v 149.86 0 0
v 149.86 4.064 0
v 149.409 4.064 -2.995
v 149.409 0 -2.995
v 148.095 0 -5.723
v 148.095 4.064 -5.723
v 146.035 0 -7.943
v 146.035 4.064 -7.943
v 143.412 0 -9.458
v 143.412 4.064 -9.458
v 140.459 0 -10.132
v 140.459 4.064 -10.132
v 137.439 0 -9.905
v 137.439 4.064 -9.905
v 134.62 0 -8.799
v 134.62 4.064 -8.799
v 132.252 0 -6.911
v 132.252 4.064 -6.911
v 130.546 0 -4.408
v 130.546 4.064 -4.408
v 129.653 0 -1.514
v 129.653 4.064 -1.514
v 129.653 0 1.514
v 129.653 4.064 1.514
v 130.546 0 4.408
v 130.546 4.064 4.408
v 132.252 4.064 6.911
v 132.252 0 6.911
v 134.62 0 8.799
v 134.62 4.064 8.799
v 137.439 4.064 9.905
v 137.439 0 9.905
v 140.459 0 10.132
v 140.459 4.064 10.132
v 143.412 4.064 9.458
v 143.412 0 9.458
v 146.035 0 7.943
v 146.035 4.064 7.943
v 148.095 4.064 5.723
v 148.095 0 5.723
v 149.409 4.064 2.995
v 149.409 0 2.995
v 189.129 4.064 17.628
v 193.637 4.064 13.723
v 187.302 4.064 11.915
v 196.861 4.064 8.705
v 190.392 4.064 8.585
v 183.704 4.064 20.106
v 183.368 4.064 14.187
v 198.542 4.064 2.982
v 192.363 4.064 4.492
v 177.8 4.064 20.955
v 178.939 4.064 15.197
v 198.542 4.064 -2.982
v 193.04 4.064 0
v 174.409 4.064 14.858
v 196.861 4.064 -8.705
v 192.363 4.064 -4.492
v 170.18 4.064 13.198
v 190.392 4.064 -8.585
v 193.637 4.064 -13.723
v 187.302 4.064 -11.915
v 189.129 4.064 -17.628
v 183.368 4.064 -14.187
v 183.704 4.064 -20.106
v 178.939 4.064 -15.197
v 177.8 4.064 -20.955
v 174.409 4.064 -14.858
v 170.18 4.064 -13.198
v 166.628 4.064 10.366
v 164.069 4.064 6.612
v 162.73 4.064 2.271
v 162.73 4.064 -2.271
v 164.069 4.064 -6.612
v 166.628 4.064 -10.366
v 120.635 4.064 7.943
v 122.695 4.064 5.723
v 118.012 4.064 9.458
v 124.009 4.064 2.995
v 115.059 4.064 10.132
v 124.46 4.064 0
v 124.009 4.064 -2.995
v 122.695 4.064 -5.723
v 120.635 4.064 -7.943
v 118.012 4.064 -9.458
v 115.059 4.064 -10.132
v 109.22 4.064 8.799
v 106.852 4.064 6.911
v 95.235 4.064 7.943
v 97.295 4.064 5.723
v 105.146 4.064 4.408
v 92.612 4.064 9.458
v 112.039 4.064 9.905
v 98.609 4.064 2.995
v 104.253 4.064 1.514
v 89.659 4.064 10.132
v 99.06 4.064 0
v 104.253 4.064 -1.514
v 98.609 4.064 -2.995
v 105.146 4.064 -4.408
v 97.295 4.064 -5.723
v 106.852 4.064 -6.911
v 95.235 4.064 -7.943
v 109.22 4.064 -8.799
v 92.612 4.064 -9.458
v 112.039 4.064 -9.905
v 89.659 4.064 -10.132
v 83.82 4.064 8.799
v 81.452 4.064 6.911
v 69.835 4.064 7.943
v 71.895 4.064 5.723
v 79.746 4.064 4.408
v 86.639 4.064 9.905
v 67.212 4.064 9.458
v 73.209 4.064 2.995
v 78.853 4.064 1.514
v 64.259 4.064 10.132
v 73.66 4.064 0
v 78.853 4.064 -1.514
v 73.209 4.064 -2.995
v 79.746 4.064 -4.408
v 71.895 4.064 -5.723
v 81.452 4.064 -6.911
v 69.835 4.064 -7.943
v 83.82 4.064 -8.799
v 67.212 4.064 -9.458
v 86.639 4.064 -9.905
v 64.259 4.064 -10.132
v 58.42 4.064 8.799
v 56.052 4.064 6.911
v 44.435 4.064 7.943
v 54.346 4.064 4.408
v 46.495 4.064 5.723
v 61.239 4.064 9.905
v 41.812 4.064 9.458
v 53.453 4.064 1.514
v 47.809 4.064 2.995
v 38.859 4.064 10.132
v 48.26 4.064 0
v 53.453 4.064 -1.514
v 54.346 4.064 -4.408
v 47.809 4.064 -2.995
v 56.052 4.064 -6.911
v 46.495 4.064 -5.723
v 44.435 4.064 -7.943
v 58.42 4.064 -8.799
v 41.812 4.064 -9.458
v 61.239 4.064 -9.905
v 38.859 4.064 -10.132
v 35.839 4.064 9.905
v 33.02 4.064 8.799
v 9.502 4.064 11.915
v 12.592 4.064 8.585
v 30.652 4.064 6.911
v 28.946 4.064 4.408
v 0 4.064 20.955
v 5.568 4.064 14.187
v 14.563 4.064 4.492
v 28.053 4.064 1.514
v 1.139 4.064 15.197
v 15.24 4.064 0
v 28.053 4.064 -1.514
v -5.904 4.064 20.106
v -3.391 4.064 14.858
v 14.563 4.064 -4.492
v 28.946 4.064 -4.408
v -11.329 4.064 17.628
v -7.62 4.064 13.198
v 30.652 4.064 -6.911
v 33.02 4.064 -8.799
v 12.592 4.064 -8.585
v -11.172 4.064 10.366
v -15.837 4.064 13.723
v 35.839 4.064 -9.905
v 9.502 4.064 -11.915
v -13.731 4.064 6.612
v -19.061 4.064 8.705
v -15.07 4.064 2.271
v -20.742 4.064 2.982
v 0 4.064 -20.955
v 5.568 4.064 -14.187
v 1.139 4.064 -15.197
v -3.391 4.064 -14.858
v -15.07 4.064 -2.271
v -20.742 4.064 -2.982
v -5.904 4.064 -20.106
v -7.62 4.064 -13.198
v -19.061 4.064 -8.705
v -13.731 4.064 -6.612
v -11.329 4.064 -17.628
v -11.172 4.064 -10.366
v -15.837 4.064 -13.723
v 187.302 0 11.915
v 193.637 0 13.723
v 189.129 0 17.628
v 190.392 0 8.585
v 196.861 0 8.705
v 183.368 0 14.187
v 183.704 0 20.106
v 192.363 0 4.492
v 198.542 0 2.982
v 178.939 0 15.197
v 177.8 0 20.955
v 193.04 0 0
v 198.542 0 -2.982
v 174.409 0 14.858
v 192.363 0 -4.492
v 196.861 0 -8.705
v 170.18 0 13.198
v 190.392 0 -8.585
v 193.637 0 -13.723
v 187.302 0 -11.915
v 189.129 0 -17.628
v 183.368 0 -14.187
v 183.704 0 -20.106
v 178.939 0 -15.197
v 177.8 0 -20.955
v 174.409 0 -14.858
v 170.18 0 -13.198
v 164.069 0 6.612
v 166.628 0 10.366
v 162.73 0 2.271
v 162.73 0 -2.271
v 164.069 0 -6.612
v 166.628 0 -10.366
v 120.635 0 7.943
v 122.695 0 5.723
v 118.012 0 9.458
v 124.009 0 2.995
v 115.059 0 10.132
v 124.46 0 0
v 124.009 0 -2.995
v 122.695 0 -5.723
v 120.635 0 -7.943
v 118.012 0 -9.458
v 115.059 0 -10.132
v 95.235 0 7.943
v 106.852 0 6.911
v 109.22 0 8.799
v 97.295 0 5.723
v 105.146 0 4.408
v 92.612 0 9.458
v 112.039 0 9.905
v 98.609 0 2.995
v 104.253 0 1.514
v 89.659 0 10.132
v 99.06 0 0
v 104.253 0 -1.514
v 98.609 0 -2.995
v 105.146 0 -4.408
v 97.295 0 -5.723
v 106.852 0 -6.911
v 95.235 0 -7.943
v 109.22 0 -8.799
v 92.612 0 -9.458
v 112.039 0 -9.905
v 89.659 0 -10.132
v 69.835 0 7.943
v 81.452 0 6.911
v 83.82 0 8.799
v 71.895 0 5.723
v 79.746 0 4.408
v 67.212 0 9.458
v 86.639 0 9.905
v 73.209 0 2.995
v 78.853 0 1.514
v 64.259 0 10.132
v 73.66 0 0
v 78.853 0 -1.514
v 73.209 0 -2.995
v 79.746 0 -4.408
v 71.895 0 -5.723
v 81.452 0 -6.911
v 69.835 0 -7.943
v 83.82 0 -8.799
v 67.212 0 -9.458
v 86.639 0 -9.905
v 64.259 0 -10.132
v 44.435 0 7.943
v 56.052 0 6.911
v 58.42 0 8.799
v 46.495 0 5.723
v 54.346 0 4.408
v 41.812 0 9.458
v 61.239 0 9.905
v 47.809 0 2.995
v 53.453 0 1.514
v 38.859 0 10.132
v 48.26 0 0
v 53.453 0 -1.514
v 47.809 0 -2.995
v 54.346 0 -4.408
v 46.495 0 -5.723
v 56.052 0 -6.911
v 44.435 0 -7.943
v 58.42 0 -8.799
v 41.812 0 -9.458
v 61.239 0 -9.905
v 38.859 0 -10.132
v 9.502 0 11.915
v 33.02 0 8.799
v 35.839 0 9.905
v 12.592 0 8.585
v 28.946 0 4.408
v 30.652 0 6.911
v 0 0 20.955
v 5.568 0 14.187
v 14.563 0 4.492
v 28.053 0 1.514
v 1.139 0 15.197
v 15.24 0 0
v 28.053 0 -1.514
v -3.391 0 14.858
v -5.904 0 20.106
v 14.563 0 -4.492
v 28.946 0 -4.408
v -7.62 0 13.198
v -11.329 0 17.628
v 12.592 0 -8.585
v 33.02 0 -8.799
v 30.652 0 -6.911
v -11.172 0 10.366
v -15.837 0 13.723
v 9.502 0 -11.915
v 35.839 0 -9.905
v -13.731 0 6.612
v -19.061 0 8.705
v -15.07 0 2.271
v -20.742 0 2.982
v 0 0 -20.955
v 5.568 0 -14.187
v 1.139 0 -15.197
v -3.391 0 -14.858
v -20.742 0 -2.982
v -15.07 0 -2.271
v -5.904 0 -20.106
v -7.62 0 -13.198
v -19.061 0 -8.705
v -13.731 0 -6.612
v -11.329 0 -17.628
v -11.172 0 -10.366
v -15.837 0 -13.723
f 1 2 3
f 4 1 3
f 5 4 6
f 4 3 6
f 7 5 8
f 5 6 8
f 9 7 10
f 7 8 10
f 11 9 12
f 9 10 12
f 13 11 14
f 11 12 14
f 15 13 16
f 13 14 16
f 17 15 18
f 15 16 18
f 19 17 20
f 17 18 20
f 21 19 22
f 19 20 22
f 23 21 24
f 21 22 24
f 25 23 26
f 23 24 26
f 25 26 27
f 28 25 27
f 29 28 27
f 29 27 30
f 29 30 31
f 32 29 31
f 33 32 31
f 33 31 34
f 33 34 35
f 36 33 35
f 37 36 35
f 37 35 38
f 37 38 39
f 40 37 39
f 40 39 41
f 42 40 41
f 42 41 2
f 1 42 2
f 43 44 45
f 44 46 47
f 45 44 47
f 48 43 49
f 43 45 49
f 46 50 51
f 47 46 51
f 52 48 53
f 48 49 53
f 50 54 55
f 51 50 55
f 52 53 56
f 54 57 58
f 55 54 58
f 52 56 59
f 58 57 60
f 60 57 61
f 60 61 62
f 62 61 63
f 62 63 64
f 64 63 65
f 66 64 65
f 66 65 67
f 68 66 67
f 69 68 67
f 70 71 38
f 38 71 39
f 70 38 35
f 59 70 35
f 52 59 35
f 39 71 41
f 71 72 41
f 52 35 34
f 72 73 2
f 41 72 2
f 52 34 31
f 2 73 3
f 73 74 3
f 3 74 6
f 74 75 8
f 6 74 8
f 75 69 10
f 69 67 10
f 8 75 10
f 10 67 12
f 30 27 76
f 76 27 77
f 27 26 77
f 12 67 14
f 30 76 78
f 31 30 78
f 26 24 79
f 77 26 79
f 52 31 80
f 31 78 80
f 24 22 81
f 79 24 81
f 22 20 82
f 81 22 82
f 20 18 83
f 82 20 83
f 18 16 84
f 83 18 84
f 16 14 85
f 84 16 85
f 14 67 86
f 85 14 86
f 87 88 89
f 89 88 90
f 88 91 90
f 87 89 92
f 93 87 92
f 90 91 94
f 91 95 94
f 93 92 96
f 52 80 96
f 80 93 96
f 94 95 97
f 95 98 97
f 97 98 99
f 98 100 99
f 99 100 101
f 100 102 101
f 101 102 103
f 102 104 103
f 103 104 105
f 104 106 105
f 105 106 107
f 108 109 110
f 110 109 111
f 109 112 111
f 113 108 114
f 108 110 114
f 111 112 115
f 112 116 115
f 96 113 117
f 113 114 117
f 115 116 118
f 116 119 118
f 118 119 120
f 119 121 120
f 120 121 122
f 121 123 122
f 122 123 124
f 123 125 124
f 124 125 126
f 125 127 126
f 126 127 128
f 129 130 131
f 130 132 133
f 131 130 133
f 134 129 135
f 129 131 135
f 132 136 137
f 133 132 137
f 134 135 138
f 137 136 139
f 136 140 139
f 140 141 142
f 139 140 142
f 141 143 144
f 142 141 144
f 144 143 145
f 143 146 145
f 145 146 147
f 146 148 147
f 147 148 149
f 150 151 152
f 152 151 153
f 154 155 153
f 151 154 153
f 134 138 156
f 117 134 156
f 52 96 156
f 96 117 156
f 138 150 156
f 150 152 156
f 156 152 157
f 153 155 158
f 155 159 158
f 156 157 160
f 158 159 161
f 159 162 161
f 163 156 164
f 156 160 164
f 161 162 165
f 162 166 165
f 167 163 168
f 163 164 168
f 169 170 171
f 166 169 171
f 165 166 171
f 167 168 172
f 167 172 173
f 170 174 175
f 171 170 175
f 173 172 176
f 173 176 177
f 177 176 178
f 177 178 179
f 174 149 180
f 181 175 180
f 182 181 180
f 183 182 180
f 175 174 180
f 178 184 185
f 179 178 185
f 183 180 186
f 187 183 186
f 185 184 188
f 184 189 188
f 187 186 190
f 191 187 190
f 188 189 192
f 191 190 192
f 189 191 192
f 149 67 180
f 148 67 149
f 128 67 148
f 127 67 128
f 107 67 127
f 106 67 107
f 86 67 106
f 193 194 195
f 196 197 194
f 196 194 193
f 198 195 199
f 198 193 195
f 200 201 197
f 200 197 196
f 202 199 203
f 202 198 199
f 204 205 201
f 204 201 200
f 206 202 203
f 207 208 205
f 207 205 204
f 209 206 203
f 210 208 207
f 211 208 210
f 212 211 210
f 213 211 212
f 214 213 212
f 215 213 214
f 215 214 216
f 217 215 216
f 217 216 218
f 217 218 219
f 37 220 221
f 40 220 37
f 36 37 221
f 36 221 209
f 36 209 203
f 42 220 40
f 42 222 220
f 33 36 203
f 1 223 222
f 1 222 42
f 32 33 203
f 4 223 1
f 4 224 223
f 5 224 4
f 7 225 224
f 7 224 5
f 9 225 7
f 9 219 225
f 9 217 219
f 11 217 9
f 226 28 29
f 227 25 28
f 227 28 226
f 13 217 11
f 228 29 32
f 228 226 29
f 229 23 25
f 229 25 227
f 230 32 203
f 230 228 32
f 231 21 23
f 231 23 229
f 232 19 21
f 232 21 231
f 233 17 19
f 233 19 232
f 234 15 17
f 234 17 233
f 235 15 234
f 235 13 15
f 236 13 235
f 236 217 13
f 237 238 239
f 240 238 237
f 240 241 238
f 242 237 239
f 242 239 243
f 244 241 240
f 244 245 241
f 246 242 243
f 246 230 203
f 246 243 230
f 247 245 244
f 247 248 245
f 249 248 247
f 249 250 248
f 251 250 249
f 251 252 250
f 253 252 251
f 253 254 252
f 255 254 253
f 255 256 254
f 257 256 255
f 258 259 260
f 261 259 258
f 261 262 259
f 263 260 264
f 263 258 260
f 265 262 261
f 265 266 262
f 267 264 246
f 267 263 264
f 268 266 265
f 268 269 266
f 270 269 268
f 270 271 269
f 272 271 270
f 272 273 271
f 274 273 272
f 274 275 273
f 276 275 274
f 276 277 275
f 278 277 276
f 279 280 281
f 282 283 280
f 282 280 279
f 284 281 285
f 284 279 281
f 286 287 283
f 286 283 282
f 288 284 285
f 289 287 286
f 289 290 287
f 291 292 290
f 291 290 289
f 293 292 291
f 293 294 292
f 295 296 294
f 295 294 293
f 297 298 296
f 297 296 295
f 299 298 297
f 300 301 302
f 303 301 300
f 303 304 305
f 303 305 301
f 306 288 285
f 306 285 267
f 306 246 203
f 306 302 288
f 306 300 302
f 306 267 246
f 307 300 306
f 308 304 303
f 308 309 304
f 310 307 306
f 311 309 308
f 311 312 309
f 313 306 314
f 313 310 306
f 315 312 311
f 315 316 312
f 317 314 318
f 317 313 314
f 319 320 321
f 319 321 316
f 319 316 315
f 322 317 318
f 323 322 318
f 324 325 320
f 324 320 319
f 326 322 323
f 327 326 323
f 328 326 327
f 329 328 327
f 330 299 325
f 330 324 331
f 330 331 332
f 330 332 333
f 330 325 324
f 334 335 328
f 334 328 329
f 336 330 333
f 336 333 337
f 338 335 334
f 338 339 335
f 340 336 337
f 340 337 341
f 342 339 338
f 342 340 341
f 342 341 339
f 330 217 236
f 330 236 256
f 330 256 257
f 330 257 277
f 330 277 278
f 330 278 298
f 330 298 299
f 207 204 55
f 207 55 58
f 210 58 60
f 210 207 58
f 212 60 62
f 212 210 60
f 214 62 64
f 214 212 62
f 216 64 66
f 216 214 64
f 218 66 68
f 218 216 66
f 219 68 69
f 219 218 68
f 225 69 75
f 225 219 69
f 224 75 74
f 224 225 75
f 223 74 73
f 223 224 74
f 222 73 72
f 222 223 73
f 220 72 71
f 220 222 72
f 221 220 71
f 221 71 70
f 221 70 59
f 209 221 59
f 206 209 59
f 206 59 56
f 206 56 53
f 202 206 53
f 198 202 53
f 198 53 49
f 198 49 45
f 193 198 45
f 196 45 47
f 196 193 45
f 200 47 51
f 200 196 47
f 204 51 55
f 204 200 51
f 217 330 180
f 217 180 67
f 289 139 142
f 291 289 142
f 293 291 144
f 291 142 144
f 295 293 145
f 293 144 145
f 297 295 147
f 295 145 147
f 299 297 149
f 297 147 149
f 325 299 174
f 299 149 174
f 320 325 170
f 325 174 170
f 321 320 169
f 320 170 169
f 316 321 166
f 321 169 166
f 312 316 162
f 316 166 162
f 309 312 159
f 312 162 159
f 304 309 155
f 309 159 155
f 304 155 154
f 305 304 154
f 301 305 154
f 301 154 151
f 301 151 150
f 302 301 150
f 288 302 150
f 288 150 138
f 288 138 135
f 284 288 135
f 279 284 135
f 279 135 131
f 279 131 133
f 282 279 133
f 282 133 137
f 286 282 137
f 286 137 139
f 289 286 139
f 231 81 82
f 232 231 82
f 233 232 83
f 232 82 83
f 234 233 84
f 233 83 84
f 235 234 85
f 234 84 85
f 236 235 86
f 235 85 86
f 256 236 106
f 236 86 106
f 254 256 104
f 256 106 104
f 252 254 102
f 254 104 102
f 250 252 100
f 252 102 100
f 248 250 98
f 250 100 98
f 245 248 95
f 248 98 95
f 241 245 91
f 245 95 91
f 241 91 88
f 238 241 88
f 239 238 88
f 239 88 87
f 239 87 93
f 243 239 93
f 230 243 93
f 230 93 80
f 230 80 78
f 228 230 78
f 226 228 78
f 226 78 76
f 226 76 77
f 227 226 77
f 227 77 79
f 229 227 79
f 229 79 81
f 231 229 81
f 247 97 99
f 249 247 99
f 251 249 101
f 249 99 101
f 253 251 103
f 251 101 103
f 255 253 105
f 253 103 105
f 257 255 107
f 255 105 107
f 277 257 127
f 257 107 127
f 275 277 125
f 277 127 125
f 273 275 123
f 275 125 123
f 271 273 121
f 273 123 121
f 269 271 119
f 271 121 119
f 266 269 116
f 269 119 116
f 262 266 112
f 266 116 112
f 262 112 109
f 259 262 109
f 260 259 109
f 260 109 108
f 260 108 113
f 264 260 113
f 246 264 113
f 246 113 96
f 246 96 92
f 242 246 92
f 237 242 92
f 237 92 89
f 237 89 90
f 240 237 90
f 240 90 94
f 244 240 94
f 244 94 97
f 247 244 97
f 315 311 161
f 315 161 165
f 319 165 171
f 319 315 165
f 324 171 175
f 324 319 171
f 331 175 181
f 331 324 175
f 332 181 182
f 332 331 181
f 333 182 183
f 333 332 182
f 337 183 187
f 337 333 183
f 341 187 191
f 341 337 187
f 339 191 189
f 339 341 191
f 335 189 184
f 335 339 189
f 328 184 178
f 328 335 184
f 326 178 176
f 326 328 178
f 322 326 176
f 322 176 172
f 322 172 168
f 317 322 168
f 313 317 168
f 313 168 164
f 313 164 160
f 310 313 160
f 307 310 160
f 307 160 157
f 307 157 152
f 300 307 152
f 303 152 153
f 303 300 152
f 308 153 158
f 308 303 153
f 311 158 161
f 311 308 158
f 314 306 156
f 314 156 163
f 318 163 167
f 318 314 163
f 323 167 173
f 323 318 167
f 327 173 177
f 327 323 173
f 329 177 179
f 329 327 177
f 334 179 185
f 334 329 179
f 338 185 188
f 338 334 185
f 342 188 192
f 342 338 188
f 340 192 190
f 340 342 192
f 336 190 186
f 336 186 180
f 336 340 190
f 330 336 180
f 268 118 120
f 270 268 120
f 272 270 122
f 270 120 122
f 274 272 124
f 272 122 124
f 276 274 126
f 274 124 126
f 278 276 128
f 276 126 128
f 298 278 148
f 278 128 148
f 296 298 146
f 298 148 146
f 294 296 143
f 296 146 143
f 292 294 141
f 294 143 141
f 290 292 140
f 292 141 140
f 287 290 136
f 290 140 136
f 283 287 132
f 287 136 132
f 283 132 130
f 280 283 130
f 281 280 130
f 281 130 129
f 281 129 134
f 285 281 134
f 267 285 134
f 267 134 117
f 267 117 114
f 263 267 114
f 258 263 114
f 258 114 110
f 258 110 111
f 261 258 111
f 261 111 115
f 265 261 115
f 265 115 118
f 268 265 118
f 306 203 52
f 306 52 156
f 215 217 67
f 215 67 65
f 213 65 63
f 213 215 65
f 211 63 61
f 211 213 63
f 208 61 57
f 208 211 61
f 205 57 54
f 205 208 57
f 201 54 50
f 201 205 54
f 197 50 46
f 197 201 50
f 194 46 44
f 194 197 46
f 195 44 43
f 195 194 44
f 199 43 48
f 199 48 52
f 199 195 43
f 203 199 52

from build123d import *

# Parameters (mm, degrees)
SKETCH1_R           = 15.24
BOSS_EXTRUDE1_DEPTH = 4.064
SKETCH2_R           = 10.16
CUT_EXTRUDE1_DEPTH  = 5.064
LPATTERN1_COUNT     = 5
LPATTERN1_PITCH     = 25.4


with BuildPart() as part:
    # Sketch1 → Boss-Extrude1 (new body)
    with BuildSketch(Plane(origin=(0, 0, 0), x_dir=(1, 0, 0), z_dir=(0, 1, 0))):
        with BuildLine():
            Line((0, 20.955), (177.8, 20.955))
            ThreePointArc((177.8, 20.955), (198.755, 0), (177.8, -20.955))
            Line((177.8, -20.955), (0, -20.955))
            ThreePointArc((0, -20.955), (-20.955, 0), (0, 20.955))
        make_face()
        Circle(SKETCH1_R, mode=Mode.SUBTRACT)
        with Locations((177.8, 0)):
            Circle(SKETCH1_R, mode=Mode.SUBTRACT)
    extrude(amount=BOSS_EXTRUDE1_DEPTH)

    # Sketch2 → Cut-Extrude1 (cut, through all)
    with BuildSketch(Plane(origin=(0, 4.064, 0), x_dir=(1, 0, 0), z_dir=(0, 1, 0))):
        with Locations((38.1, 0)):
            Circle(SKETCH2_R)
    cut_extrude1 = extrude(amount=-CUT_EXTRUDE1_DEPTH, mode=Mode.SUBTRACT)

    # LPattern1: Cut-Extrude1 ×5
    with Locations(*[(i * LPATTERN1_PITCH, 0, 0) for i in range(1, LPATTERN1_COUNT)]):
        add(cut_extrude1, mode=Mode.SUBTRACT)


solid = part.part
